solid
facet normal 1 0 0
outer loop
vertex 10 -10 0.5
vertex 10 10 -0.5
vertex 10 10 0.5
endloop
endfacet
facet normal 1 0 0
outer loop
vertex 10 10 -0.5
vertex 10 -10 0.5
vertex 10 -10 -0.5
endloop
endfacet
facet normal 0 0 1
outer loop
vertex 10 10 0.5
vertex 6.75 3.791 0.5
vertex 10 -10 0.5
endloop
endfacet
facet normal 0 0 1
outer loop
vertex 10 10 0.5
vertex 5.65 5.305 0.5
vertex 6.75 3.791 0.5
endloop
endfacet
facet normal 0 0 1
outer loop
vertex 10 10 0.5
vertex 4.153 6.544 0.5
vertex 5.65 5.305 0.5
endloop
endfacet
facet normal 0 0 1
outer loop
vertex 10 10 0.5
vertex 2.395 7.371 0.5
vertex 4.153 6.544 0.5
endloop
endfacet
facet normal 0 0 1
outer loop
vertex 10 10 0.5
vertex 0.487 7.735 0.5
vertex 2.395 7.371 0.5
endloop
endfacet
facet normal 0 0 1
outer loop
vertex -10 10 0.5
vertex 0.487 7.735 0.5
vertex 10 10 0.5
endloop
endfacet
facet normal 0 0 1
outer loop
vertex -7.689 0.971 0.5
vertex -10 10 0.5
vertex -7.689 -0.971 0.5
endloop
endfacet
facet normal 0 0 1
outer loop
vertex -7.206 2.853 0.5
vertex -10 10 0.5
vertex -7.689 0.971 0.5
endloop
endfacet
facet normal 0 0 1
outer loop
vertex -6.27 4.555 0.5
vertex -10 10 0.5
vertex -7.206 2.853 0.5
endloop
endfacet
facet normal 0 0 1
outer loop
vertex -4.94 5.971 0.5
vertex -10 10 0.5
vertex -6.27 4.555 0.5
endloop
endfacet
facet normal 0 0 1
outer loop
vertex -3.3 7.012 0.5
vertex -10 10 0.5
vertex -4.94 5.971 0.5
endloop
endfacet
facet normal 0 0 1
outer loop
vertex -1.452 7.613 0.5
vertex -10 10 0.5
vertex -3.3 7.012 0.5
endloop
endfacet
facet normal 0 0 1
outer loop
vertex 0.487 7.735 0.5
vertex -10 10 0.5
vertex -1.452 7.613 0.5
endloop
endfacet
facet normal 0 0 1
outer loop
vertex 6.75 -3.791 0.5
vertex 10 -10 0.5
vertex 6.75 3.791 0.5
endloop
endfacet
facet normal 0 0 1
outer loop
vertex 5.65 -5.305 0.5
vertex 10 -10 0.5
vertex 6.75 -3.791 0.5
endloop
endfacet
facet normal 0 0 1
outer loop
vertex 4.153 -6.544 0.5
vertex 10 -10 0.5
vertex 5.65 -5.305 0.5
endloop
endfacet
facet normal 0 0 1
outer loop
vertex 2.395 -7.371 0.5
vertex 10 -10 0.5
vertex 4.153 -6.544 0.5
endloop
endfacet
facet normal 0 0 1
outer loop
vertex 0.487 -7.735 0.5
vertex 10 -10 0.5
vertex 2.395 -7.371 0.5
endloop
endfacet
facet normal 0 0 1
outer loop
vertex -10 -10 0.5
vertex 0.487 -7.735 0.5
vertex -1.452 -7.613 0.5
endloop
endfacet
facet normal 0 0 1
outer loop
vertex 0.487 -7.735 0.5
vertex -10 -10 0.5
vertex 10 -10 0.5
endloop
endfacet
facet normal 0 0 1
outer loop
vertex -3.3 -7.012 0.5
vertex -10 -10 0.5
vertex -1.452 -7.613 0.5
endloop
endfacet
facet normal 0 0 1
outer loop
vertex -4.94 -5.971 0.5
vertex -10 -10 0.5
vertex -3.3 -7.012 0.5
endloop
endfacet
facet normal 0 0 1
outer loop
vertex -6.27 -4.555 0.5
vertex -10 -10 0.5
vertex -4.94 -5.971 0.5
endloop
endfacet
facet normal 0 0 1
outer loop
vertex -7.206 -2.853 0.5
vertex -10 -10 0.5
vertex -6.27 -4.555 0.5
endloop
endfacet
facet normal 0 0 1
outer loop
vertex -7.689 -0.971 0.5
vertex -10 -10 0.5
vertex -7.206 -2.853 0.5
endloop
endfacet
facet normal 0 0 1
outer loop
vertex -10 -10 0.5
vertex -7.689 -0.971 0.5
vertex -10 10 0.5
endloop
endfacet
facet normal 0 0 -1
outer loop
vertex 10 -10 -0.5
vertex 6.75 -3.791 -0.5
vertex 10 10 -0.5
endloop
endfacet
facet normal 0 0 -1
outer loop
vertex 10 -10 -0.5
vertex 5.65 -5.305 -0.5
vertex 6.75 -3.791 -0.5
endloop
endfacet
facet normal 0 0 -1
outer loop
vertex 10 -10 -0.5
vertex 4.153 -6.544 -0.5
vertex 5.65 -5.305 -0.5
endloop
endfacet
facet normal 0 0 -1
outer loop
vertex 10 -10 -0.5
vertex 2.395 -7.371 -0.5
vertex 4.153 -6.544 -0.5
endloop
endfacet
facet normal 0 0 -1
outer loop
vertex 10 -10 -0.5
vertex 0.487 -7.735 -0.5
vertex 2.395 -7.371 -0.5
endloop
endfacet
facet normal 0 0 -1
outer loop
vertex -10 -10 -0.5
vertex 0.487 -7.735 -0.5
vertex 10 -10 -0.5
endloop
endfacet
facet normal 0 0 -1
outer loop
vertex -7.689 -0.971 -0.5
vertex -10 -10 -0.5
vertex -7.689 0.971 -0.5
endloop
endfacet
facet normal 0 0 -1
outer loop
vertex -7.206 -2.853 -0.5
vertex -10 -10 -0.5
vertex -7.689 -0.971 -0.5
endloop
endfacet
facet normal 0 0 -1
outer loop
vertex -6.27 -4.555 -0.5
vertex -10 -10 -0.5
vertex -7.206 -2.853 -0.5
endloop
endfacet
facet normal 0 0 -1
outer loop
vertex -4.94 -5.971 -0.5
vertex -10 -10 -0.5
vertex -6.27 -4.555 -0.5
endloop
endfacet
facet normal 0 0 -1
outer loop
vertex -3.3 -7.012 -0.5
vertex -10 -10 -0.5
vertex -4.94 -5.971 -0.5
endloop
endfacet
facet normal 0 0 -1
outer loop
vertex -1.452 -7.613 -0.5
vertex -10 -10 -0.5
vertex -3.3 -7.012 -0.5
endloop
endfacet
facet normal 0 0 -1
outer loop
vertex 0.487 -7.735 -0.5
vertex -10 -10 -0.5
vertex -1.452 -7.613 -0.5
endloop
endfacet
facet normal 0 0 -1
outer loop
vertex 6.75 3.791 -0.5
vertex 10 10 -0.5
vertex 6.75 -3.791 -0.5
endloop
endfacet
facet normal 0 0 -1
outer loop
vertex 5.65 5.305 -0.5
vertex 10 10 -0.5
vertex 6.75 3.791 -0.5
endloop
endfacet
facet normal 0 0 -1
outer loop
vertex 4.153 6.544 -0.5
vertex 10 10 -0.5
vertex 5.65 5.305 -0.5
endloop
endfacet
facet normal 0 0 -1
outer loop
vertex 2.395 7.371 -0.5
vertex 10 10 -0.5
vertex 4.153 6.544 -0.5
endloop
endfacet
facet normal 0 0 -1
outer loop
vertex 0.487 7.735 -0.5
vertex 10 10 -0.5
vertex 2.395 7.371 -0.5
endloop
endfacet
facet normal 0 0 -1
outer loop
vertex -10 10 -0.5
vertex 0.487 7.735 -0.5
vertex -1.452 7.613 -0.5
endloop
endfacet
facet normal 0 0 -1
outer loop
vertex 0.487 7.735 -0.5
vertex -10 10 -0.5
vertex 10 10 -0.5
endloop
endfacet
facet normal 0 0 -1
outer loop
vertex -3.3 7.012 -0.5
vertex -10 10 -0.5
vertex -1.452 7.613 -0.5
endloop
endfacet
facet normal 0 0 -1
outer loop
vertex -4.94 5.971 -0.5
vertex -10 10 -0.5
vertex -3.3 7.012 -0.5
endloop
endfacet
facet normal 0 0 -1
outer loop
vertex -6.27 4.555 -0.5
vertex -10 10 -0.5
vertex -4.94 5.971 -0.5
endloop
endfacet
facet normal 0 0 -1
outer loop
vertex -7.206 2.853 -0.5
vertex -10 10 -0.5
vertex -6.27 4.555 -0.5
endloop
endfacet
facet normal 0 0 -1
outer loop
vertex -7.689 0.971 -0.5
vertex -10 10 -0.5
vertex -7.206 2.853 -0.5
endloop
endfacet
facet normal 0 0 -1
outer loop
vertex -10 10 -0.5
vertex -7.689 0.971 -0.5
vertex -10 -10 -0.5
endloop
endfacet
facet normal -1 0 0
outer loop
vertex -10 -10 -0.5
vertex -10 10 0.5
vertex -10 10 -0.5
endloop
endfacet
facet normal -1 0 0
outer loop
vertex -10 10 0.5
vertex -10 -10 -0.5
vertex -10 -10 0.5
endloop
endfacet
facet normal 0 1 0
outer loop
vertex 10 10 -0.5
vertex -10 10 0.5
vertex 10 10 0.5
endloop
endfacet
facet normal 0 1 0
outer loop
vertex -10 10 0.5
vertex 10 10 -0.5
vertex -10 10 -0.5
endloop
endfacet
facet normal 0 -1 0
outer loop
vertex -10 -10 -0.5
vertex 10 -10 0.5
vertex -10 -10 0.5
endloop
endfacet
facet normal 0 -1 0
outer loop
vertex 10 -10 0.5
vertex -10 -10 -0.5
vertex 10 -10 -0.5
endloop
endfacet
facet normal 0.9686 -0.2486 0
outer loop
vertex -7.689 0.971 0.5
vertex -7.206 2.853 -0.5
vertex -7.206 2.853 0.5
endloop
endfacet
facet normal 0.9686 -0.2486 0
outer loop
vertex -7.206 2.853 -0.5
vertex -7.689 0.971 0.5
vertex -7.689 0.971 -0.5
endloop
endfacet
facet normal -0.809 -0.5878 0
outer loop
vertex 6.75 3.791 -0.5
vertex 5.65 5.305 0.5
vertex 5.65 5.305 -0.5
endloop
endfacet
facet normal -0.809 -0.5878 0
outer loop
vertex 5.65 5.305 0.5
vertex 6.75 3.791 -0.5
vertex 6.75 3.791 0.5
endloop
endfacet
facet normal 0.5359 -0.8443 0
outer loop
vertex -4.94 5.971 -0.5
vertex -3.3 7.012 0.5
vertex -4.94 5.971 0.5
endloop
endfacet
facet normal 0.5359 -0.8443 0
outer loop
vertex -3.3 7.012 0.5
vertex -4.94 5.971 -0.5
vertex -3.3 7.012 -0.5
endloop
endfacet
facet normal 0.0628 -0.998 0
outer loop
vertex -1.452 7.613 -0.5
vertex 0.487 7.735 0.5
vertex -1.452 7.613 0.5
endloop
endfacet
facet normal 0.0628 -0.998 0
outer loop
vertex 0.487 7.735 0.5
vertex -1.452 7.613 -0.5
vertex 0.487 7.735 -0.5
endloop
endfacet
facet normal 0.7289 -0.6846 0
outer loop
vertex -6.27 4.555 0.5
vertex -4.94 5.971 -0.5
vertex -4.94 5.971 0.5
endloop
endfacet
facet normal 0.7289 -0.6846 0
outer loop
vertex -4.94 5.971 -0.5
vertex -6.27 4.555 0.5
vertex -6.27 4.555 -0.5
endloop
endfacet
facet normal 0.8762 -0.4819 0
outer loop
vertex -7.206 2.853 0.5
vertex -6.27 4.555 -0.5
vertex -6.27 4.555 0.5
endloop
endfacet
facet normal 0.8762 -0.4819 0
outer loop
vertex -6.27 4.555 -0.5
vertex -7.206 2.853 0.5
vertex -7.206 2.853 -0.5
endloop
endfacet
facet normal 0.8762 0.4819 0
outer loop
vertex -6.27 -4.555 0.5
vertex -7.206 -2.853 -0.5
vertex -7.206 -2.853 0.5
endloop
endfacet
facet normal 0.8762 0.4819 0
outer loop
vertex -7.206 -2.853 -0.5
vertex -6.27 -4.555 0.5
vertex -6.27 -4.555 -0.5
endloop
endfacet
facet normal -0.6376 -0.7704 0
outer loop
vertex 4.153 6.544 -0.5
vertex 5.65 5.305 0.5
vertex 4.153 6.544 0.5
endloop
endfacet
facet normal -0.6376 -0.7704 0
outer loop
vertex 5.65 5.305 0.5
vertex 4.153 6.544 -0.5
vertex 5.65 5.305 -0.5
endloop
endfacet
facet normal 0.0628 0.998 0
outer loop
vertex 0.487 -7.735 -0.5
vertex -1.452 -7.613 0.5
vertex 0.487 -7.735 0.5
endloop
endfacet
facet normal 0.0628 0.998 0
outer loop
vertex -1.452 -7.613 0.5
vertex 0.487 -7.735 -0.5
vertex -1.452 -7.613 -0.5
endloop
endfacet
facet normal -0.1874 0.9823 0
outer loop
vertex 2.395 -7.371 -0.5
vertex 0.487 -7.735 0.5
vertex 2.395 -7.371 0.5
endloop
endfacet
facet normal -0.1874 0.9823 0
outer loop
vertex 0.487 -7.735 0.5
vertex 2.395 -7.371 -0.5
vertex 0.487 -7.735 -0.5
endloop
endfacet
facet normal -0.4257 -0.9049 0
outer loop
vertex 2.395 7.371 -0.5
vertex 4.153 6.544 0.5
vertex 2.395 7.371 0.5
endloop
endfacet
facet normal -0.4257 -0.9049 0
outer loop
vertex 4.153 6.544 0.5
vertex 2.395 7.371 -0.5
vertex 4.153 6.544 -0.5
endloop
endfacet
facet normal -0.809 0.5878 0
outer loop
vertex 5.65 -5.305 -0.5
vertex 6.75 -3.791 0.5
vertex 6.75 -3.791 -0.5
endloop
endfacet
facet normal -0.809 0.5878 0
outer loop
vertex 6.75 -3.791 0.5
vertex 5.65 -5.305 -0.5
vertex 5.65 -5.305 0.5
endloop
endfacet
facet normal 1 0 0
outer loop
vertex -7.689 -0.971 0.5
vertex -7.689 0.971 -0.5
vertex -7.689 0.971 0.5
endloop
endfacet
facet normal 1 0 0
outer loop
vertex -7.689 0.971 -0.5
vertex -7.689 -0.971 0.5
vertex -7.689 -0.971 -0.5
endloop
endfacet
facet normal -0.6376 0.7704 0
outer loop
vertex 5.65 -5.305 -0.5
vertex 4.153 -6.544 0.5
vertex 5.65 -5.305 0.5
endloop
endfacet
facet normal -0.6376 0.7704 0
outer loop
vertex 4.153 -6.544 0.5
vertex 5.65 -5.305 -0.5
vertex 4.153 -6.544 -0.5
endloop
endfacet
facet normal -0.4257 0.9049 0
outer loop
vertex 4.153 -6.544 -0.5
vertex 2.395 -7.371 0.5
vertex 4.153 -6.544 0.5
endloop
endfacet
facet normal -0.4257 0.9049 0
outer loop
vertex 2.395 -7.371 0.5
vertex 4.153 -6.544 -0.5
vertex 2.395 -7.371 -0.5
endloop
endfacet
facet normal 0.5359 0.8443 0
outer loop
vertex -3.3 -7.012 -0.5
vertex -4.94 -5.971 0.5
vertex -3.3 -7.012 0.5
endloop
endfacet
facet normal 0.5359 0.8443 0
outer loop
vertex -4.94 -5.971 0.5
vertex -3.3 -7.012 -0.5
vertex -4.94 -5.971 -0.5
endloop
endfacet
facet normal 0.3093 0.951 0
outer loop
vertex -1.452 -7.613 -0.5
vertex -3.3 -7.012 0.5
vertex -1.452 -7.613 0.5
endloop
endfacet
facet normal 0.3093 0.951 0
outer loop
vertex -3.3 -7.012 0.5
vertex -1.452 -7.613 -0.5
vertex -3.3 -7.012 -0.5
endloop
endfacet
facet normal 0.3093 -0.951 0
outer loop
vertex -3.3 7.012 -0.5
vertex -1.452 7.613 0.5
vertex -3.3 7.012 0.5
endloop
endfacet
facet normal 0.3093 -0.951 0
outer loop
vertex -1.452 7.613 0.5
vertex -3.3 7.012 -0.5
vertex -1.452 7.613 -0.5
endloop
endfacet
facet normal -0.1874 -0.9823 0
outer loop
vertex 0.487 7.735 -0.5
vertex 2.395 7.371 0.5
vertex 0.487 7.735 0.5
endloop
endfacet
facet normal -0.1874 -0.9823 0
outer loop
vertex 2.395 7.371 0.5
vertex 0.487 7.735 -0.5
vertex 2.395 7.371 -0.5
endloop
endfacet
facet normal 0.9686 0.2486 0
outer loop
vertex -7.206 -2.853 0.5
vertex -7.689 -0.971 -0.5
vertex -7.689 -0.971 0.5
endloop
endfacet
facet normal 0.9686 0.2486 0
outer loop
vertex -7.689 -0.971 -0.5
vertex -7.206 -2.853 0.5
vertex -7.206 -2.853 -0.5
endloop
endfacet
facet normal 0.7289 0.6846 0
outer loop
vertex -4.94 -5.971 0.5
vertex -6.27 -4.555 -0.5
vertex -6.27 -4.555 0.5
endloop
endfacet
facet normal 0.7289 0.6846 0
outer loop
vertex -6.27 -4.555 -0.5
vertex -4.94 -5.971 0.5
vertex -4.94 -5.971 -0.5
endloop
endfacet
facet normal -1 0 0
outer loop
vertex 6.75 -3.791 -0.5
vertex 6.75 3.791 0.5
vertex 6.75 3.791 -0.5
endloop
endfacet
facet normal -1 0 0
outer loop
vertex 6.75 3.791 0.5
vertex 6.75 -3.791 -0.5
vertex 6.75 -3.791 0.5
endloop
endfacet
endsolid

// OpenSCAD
platethickness=1;
aviatorD=15.5;
difference() 
{
  cube([20,20,platethickness],center=true);
    cylinder(d=aviatorD,h=platethickness,center=true);
}
translate([aviatorD/2,0,0]) cube([2,aviatorD,platethickness],center=true);
